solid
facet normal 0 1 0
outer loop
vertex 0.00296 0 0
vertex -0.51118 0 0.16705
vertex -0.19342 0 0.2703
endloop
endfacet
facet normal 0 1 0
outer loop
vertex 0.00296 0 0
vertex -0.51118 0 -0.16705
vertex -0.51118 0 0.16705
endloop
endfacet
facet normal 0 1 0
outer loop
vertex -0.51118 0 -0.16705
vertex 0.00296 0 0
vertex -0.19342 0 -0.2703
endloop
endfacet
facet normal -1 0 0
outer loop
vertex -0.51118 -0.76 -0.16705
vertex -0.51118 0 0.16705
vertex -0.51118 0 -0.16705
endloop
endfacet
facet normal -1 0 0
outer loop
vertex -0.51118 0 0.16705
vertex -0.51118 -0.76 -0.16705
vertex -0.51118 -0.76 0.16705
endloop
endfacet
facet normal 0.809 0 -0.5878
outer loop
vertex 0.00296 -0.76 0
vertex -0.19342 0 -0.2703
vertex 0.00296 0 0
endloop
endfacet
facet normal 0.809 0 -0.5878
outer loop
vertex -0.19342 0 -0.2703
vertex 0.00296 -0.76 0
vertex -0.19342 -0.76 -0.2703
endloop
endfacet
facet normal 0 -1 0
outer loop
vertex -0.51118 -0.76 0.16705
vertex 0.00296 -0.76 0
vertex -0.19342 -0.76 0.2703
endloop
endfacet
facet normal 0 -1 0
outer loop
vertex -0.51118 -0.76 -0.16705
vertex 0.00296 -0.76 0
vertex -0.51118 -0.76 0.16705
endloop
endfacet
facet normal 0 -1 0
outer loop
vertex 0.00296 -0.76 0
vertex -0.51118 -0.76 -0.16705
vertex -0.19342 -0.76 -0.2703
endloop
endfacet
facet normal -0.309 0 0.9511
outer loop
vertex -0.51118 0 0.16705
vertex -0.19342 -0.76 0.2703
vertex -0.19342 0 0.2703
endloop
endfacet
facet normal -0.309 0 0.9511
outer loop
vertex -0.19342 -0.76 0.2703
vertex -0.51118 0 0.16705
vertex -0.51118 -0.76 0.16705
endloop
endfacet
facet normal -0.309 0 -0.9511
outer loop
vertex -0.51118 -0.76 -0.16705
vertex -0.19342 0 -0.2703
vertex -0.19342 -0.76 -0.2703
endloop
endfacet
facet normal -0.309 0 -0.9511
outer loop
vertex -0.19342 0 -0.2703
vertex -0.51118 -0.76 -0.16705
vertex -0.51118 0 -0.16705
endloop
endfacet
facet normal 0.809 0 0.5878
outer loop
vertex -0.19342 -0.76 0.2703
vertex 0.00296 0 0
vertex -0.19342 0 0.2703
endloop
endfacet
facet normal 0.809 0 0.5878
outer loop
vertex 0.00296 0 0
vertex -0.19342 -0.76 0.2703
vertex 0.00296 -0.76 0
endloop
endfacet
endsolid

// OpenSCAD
EPS = 0.01;

module solid0() {
    translate([-0.28125, 0.0, 0.0])
    rotate([90, 0, 0])
    linear_extrude(height=0.75 + EPS)
    circle(r=0.28421052631578947);
}

module solid1() {
    translate([-0.109375, 0.0, 0.75])
    rotate([90, 0, 0])
    linear_extrude(height=-0.328125 - EPS)
    circle(r=0.11052631578947367);
}

difference() {
    solid0();
    solid1();
}
